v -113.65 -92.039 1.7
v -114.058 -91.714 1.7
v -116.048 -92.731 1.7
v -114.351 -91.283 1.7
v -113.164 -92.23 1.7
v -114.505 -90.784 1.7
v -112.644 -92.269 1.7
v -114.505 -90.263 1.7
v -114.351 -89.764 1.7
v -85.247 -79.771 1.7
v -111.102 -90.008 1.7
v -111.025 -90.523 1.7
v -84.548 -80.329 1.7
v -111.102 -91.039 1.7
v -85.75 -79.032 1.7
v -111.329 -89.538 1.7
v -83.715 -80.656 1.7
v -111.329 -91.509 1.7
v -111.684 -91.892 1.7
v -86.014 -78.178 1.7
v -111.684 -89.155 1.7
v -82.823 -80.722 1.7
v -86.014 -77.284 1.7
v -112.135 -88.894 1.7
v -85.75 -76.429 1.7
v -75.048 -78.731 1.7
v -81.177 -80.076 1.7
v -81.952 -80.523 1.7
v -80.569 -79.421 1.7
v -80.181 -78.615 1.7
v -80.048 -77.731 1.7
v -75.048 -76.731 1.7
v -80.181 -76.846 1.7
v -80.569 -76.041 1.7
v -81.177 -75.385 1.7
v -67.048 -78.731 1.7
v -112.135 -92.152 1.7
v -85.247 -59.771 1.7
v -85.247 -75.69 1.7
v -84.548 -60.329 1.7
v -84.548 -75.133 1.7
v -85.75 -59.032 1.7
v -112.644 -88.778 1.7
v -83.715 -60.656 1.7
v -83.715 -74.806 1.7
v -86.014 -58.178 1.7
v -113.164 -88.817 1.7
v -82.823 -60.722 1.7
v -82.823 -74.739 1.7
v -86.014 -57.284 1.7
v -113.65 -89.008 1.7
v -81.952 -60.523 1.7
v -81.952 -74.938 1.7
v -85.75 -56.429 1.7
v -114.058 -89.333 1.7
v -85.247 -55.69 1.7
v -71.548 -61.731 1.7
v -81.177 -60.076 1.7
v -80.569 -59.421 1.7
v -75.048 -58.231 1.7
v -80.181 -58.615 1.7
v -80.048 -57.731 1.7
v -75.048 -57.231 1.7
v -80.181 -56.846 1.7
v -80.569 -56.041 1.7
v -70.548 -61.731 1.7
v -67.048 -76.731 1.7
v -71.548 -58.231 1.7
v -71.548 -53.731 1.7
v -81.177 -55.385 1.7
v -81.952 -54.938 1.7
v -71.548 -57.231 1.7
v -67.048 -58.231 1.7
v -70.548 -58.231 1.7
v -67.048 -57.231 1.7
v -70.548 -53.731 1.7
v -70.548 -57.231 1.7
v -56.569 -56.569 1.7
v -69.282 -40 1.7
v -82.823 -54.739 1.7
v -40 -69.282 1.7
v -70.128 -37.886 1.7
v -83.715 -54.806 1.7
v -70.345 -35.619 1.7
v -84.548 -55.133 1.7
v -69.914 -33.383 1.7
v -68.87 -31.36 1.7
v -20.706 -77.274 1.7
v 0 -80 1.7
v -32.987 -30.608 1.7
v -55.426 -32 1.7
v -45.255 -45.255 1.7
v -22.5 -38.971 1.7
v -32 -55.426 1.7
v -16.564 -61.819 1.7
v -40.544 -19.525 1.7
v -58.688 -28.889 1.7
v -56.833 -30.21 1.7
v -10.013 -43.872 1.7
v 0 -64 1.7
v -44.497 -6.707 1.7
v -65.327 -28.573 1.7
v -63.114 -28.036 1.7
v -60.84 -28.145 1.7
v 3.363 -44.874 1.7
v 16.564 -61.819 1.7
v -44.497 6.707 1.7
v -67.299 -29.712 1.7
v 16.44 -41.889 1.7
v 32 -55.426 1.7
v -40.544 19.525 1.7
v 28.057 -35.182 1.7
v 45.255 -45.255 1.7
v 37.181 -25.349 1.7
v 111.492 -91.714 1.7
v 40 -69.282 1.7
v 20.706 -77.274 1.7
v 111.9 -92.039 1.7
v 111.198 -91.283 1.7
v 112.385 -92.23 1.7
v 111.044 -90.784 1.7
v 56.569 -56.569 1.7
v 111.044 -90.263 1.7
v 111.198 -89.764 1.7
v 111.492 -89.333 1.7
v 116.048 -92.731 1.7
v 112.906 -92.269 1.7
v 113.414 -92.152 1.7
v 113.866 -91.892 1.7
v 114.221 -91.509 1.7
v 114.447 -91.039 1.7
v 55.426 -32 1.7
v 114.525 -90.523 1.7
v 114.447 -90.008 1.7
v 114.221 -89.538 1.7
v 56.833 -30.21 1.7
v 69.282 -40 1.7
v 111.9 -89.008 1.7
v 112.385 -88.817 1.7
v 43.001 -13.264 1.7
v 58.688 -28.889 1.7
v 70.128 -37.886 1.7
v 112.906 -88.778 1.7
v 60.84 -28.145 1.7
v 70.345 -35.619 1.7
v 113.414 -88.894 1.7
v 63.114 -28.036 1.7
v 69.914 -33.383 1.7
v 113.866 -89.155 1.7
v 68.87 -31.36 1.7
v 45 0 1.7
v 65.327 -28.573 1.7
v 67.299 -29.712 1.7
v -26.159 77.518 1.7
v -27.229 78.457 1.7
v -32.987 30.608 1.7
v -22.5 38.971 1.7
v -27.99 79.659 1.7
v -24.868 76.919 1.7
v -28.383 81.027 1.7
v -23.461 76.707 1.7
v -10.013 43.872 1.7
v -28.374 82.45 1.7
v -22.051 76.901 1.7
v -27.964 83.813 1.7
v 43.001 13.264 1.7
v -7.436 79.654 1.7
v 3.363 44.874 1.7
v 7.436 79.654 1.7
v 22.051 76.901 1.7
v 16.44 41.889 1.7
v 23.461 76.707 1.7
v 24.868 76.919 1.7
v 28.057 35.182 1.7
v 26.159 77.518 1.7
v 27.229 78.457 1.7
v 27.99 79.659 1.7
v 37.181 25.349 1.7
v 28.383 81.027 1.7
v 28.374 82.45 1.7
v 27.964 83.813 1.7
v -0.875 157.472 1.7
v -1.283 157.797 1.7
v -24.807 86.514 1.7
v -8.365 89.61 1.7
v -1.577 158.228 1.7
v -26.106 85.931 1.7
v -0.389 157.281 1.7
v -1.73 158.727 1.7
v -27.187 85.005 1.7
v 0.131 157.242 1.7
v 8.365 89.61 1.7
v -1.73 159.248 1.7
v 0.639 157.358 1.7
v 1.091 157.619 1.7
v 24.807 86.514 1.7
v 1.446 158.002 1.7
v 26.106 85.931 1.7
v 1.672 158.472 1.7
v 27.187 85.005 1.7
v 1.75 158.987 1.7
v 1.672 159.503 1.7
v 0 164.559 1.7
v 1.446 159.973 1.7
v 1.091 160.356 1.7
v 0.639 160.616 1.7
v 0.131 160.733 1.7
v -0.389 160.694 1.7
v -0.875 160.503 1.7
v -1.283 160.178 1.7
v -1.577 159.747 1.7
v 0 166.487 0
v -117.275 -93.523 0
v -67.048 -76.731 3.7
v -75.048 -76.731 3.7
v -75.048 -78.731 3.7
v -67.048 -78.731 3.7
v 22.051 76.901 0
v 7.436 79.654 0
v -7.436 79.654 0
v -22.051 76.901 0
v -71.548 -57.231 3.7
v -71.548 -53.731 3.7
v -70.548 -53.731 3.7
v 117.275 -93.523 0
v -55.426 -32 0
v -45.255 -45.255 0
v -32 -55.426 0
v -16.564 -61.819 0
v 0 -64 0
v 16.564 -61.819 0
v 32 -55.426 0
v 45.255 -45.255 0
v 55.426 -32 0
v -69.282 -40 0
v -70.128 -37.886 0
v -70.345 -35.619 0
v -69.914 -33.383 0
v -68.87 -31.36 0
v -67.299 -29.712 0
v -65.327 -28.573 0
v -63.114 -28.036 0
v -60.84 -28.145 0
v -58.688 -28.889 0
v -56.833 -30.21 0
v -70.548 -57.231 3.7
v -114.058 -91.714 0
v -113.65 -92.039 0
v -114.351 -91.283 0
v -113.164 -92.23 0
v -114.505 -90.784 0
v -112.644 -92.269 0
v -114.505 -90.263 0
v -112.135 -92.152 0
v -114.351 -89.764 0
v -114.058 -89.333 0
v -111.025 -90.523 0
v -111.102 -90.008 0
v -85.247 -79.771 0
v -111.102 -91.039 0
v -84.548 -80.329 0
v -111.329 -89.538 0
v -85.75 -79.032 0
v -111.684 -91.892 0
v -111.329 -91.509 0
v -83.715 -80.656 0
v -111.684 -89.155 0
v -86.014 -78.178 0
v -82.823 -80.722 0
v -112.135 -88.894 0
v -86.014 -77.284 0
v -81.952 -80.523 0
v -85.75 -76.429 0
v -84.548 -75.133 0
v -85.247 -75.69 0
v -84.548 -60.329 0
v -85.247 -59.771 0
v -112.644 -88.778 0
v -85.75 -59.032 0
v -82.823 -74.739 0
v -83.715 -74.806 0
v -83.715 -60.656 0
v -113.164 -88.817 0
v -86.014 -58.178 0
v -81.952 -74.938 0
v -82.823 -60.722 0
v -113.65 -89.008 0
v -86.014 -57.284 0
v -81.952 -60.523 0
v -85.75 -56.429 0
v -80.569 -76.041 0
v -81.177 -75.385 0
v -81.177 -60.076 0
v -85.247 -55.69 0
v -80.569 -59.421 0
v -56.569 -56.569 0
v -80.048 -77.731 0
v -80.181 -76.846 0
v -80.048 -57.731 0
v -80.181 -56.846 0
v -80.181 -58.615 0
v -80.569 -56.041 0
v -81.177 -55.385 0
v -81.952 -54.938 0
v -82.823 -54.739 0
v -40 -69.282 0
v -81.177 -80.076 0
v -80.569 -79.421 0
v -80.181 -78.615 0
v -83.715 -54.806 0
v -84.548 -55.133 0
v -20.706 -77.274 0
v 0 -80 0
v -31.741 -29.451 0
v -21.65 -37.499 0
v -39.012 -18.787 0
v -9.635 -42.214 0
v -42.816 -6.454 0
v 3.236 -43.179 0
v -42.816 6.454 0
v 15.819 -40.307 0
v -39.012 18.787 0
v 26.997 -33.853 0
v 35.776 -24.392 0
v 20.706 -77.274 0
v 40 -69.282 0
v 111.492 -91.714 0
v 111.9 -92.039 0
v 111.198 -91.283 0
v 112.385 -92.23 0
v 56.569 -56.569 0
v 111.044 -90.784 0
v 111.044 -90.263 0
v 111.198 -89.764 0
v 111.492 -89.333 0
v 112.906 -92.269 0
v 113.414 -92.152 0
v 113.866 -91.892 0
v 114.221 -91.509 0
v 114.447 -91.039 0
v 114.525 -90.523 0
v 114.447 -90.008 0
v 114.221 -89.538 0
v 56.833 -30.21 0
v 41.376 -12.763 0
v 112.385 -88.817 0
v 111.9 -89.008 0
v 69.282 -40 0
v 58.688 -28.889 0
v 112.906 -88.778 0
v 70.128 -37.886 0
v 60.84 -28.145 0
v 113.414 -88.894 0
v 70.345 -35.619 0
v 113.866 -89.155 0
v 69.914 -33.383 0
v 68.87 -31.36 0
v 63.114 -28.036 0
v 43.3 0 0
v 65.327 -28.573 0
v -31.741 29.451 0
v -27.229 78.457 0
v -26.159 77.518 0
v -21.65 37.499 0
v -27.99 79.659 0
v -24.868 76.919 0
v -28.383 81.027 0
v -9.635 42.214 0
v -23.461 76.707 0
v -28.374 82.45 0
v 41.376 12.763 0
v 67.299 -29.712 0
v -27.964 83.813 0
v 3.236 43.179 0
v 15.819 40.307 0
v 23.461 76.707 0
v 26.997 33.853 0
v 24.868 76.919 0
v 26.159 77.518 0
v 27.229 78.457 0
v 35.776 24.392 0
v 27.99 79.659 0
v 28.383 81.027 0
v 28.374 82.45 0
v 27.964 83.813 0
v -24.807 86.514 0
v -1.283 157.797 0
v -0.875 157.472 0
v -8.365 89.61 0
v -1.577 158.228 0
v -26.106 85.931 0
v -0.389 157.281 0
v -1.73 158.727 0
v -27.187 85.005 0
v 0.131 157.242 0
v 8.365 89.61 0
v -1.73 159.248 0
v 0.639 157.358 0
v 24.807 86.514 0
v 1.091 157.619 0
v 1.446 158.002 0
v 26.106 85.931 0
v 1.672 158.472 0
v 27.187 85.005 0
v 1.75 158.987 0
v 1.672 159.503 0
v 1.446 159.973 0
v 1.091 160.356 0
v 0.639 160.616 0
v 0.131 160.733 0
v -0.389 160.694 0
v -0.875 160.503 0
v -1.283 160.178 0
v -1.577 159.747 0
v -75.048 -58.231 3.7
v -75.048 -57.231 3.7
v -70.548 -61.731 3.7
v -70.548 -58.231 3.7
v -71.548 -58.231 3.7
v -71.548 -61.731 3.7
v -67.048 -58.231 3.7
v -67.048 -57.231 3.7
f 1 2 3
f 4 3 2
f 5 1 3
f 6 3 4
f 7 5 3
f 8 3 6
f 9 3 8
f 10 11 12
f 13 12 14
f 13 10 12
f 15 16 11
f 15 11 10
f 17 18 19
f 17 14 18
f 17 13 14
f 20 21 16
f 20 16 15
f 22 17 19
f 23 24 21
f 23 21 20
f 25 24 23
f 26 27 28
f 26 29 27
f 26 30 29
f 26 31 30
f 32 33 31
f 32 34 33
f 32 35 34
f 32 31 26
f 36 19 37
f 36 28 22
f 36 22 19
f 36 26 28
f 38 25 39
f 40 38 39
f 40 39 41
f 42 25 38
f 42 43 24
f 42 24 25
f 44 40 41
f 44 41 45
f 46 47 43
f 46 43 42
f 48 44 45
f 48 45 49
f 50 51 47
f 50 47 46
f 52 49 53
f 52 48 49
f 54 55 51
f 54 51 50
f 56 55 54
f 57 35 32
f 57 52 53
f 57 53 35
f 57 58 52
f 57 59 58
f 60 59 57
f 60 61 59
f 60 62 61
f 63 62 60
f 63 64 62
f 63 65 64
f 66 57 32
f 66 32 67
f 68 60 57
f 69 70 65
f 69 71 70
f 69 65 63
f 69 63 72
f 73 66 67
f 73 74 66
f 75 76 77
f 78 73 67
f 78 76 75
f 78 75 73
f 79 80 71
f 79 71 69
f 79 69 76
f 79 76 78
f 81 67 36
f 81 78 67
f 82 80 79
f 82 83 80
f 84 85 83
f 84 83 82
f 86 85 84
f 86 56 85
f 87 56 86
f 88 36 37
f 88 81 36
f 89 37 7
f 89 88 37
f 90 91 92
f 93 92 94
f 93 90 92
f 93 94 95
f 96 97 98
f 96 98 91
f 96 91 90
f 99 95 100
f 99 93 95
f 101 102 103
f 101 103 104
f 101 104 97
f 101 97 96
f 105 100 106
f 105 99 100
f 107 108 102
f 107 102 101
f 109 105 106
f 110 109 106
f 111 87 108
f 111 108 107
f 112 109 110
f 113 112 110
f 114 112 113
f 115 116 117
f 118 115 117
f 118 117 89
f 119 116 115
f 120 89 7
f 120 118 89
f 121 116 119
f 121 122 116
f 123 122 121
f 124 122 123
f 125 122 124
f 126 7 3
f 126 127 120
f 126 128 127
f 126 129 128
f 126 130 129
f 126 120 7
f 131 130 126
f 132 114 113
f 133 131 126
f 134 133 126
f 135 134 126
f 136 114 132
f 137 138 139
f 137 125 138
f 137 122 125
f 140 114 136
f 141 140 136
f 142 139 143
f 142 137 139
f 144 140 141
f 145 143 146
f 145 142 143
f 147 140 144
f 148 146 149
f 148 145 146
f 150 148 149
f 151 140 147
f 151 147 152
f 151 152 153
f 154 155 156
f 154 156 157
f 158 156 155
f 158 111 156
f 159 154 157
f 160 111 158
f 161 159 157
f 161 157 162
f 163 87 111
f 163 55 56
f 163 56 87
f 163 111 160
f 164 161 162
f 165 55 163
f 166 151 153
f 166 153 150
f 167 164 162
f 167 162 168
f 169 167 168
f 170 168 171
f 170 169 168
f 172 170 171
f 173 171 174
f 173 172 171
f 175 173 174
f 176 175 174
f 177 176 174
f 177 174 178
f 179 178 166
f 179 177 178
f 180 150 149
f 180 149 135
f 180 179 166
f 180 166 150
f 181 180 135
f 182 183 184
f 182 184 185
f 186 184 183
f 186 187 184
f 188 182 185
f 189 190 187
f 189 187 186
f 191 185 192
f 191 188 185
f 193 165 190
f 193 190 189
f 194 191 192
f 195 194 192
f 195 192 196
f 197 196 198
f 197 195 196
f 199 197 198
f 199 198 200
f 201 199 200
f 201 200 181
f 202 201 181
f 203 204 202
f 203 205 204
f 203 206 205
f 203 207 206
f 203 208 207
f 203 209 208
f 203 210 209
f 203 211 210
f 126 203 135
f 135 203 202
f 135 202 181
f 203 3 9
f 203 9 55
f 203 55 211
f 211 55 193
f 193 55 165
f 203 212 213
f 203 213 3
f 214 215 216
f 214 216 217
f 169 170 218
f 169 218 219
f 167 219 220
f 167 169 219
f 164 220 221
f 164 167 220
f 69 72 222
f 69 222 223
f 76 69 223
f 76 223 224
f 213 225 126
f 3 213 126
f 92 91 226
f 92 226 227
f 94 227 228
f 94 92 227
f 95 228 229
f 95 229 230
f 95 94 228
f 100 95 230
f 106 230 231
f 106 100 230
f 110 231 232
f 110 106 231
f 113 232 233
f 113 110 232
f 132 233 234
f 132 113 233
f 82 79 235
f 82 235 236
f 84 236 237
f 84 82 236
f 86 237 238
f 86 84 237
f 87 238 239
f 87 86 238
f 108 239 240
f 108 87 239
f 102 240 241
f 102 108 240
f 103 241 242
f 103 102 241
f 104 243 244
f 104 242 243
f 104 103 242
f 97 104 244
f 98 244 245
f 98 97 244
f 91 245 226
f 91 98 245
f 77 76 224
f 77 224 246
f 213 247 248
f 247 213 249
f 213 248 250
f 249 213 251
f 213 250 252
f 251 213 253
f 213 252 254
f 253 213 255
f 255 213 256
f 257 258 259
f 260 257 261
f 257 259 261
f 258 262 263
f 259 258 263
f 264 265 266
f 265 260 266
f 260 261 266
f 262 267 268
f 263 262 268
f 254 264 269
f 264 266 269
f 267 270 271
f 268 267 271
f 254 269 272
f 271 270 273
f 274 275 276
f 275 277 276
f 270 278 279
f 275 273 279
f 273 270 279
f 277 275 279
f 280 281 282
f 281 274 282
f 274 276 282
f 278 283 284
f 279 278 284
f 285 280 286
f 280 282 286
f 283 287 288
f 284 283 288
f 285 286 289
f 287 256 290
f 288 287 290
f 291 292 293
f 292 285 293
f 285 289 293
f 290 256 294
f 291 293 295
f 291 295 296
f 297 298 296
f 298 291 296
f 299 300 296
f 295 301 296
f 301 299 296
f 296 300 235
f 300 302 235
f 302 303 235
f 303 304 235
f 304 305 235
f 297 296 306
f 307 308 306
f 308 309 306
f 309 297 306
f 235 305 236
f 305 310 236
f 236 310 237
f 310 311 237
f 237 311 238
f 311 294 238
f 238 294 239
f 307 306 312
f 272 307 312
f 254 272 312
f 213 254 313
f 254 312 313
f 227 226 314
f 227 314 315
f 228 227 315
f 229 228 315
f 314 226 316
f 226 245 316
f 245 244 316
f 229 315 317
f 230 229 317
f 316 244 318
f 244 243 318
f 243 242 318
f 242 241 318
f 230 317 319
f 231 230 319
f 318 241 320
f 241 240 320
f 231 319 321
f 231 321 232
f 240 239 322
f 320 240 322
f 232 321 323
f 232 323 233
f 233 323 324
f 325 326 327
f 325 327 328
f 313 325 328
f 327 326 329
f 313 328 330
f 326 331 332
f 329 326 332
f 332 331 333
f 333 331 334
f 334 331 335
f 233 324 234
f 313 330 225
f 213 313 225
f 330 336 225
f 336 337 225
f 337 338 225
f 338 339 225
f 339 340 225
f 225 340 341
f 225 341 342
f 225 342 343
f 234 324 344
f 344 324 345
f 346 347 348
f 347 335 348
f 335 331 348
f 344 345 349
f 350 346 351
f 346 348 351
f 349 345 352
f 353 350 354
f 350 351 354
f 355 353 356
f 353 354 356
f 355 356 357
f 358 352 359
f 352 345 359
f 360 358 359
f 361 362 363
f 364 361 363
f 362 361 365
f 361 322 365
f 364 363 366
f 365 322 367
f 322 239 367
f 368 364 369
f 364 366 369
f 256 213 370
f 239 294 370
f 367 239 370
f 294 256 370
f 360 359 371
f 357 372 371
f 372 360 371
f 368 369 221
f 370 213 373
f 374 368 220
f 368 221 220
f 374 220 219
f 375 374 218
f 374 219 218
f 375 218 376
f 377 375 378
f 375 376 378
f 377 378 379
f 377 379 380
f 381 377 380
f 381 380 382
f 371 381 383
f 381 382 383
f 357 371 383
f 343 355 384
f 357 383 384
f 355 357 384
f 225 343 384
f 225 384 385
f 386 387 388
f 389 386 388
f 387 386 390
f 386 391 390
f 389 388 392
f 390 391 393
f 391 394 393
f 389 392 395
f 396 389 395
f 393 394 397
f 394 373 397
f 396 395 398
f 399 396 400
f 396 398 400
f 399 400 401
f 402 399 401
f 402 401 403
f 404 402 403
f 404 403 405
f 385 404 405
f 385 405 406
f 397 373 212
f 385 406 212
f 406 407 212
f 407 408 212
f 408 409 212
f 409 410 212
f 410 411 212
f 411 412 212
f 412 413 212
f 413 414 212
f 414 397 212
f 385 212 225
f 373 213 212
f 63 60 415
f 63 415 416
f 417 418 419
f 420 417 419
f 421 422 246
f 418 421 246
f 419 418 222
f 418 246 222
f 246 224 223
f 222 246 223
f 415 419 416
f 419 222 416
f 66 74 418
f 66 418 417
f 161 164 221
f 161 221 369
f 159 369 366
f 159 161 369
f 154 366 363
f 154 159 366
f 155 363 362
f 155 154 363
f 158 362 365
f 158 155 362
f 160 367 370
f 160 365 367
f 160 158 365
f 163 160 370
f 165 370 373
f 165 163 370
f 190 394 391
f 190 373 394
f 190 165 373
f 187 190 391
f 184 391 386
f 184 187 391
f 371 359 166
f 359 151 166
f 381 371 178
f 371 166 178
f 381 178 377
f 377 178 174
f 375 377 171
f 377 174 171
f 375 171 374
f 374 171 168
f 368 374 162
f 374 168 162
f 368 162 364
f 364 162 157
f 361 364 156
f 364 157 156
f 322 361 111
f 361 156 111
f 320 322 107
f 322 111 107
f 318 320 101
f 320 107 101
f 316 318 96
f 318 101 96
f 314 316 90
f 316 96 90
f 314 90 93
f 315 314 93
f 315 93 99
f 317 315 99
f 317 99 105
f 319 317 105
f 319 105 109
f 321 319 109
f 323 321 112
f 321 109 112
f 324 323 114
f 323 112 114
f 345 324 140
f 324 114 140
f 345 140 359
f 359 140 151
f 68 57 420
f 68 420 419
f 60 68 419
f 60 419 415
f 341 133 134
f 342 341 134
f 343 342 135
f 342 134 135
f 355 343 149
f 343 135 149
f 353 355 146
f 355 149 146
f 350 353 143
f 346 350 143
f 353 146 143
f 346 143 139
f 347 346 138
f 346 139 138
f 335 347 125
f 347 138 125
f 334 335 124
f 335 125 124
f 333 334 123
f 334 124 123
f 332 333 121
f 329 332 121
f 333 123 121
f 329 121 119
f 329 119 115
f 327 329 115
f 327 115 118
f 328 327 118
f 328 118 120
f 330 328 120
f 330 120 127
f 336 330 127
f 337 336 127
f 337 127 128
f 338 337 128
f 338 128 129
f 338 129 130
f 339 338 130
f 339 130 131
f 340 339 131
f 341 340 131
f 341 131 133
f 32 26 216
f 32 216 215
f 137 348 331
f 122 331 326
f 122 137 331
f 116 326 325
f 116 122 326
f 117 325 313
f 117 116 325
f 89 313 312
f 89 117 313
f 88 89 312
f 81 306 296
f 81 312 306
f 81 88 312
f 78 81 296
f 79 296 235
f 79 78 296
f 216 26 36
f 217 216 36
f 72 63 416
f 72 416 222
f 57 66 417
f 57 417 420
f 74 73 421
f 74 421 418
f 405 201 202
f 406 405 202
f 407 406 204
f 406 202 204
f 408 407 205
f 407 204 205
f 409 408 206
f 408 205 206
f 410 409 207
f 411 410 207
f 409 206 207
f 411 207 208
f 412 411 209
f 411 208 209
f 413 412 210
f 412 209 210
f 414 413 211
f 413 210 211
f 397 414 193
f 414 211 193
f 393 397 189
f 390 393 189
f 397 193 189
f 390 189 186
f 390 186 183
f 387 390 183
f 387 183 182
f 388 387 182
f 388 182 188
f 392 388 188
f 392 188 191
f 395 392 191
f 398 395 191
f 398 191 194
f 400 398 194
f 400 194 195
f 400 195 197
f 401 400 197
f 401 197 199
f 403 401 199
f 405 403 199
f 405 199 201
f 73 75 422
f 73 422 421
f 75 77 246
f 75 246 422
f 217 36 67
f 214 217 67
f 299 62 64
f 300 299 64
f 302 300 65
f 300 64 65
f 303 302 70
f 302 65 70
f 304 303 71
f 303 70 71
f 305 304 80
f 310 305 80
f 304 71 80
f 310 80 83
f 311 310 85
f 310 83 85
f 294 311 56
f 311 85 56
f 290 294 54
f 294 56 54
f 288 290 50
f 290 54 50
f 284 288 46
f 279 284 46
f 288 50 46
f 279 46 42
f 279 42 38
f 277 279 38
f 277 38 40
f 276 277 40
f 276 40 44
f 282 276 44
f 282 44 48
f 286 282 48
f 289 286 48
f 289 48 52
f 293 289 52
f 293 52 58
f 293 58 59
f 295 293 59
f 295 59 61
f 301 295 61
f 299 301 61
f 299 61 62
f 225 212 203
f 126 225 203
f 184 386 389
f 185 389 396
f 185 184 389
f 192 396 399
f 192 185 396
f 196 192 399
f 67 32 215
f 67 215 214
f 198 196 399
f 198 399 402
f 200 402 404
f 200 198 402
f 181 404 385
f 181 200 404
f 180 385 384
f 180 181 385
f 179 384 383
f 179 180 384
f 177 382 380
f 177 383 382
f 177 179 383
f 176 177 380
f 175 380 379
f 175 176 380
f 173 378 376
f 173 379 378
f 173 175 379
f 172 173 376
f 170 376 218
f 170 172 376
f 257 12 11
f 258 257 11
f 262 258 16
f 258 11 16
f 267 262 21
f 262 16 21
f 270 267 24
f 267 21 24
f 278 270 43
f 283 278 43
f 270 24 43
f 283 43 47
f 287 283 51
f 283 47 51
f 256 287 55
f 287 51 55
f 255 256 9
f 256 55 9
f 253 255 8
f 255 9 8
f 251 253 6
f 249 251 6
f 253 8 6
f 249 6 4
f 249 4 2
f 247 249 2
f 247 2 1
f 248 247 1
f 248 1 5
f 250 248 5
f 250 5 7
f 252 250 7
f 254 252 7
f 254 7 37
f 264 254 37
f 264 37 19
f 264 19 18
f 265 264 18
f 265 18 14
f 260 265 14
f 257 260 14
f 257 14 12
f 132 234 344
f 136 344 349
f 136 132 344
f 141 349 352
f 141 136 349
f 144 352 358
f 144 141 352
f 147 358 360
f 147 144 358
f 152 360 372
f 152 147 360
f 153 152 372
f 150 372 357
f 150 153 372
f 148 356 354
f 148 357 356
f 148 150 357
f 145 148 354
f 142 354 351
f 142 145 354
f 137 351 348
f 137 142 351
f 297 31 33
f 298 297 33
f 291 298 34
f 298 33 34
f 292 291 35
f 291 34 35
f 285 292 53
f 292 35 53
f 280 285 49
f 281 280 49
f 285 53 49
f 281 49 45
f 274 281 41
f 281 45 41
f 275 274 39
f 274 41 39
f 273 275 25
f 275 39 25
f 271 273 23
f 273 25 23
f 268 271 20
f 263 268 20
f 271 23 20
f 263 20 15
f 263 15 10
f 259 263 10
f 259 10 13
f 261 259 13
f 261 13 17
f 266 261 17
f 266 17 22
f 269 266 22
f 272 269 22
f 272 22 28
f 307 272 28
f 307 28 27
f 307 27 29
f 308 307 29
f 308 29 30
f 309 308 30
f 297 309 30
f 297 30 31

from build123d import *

# Parameters (mm, degrees)
BOSS_EXTRUDE1_DEPTH = 1.7
BOSS_EXTRUDE1_TAPER = 25
SKETCH2_R           = 40
CUT_EXTRUDE1_DEPTH  = 204.652444278
SKETCH3_R           = 1.75
CUT_EXTRUDE2_DEPTH  = 204.652444278
CHAMFER1_SIZE       = 5
CUT_EXTRUDE4_REACH  = 205.652
SKETCH4_R           = 3
SKETCH6_W           = 8
SKETCH6_H           = 2
BOSS_EXTRUDE2_DEPTH = 2


with BuildPart() as part:
    # Sketch1 → Boss-Extrude1 (new body)
    with BuildSketch(Plane.XY):
        Polygon((117.27472237, -93.523470279), (0, 166.487439626), (-117.27472237, -93.523470279), align=None)
    extrude(amount=BOSS_EXTRUDE1_DEPTH, taper=BOSS_EXTRUDE1_TAPER)

    # Sketch2 → Cut-Extrude1 (cut, through all)
    with BuildSketch(Plane.XY.offset(1.7)):
        Circle(SKETCH2_R)
    extrude(amount=-CUT_EXTRUDE1_DEPTH, mode=Mode.SUBTRACT)

    # Sketch3 → Cut-Extrude2 (cut, through all)
    with BuildSketch(Plane.XY.offset(1.7)):
        with Locations((0, 158.987439626)):
            Circle(SKETCH3_R)
        with Locations((112.77472237, -90.523470279)):
            Circle(SKETCH3_R)
        with Locations((-112.77472237, -90.523470279)):
            Circle(SKETCH3_R)
    extrude(amount=-CUT_EXTRUDE2_DEPTH, mode=Mode.SUBTRACT)

    # Chamfer1
    # the kernel refuses this chamfer: 5 mm, written as the material it takes off along each edge
    with BuildSketch(Plane(origin=(0, 0, 1.7), x_dir=(1, 0, 0), z_dir=(0, -1, 0))) as chamfer1_piece_1:
        Polygon((40, -CHAMFER1_SIZE), (40 + CHAMFER1_SIZE, 0), (40, 0), align=None)
    revolve(axis=Axis((0, 0, 1.7), (0, 0, 1)), mode=Mode.SUBTRACT)

    # Sketch4 → Cut-Extrude4 (cut, up to next)
    with BuildSketch(Plane.XY.offset(1.7), mode=Mode.PRIVATE) as cut_extrude4_sk1:
        with Locations((-83.047547857, -57.73074726)):
            Circle(SKETCH4_R)
    cut_extrude4_tool1 = extrude(cut_extrude4_sk1.sketch, amount=-CUT_EXTRUDE4_REACH, mode=Mode.PRIVATE) & part.part
    # Sketch4 → Cut-Extrude4 (cut, up to next)
    with BuildSketch(Plane.XY.offset(1.7), mode=Mode.PRIVATE) as cut_extrude4_sk2:
        with Locations((-83.047547857, -77.73074726)):
            Circle(SKETCH4_R)
    cut_extrude4_tool2 = extrude(cut_extrude4_sk2.sketch, amount=-CUT_EXTRUDE4_REACH, mode=Mode.PRIVATE) & part.part
    # Sketch4 → Cut-Extrude4 (cut, up to next)
    with BuildSketch(Plane.XY.offset(1.7), mode=Mode.PRIVATE) as cut_extrude4_sk3:
        with BuildLine():
            ThreePointArc((69.282032303, -40), (0, -80), (-69.282032303, -40))
            ThreePointArc((-69.282032303, -40), (-66.353829072, -29.07179677), (-55.425625842, -32))
            ThreePointArc((-55.425625842, -32), (0, -64), (55.425625842, -32))
            ThreePointArc((55.425625842, -32), (66.353829072, -29.07179677), (69.282032303, -40))
        make_face()
    cut_extrude4_tool3 = extrude(cut_extrude4_sk3.sketch, amount=-CUT_EXTRUDE4_REACH, mode=Mode.PRIVATE) & part.part
    # Sketch4 → Cut-Extrude4 (cut, up to next)
    with BuildSketch(Plane.XY.offset(1.7), mode=Mode.PRIVATE) as cut_extrude4_sk4:
        with BuildLine():
            ThreePointArc((-24.807362024, 86.513552634), (0, 90), (24.807362024, 86.513552634))
            ThreePointArc((24.807362024, 86.513552634), (28.235483724, 80.329057376), (22.050988465, 76.900935675))
            ThreePointArc((22.050988465, 76.900935675), (0, 80), (-22.050988465, 76.900935675))
            ThreePointArc((-22.050988465, 76.900935675), (-28.235483724, 80.329057376), (-24.807362024, 86.513552634))
        make_face()
    cut_extrude4_tool4 = extrude(cut_extrude4_sk4.sketch, amount=-CUT_EXTRUDE4_REACH, mode=Mode.PRIVATE) & part.part
    add(cut_extrude4_tool1.solids().sort_by_distance((-83.047548, -57.730747, 1.7))[0], mode=Mode.SUBTRACT)
    add(cut_extrude4_tool2.solids().sort_by_distance((-83.047548, -77.730747, 1.7))[0], mode=Mode.SUBTRACT)
    add(cut_extrude4_tool3.solids().sort_by_distance((0, -78.499912, 1.7))[0], mode=Mode.SUBTRACT)
    add(cut_extrude4_tool4.solids().sort_by_distance((0, 83.588343, 1.7))[0], mode=Mode.SUBTRACT)

    # Sketch6 → Boss-Extrude2 (add)
    with BuildSketch(Plane.XY.offset(1.7)):
        Polygon((-71.547547857, -53.73074726), (-70.547547857, -53.73074726), (-70.547547857, -57.23074726), (-67.047547857, -57.23074726), (-67.047547857, -58.23074726), (-70.547547857, -58.23074726), (-70.547547857, -61.73074726), (-71.547547857, -61.73074726), (-71.547547857, -58.23074726), (-75.047547857, -58.23074726), (-75.047547857, -57.23074726), (-71.547547857, -57.23074726), align=None)
        with Locations((-71.047547857, -77.73074726)):
            Rectangle(SKETCH6_W, SKETCH6_H)
    extrude(amount=BOSS_EXTRUDE2_DEPTH)


solid = part.part
